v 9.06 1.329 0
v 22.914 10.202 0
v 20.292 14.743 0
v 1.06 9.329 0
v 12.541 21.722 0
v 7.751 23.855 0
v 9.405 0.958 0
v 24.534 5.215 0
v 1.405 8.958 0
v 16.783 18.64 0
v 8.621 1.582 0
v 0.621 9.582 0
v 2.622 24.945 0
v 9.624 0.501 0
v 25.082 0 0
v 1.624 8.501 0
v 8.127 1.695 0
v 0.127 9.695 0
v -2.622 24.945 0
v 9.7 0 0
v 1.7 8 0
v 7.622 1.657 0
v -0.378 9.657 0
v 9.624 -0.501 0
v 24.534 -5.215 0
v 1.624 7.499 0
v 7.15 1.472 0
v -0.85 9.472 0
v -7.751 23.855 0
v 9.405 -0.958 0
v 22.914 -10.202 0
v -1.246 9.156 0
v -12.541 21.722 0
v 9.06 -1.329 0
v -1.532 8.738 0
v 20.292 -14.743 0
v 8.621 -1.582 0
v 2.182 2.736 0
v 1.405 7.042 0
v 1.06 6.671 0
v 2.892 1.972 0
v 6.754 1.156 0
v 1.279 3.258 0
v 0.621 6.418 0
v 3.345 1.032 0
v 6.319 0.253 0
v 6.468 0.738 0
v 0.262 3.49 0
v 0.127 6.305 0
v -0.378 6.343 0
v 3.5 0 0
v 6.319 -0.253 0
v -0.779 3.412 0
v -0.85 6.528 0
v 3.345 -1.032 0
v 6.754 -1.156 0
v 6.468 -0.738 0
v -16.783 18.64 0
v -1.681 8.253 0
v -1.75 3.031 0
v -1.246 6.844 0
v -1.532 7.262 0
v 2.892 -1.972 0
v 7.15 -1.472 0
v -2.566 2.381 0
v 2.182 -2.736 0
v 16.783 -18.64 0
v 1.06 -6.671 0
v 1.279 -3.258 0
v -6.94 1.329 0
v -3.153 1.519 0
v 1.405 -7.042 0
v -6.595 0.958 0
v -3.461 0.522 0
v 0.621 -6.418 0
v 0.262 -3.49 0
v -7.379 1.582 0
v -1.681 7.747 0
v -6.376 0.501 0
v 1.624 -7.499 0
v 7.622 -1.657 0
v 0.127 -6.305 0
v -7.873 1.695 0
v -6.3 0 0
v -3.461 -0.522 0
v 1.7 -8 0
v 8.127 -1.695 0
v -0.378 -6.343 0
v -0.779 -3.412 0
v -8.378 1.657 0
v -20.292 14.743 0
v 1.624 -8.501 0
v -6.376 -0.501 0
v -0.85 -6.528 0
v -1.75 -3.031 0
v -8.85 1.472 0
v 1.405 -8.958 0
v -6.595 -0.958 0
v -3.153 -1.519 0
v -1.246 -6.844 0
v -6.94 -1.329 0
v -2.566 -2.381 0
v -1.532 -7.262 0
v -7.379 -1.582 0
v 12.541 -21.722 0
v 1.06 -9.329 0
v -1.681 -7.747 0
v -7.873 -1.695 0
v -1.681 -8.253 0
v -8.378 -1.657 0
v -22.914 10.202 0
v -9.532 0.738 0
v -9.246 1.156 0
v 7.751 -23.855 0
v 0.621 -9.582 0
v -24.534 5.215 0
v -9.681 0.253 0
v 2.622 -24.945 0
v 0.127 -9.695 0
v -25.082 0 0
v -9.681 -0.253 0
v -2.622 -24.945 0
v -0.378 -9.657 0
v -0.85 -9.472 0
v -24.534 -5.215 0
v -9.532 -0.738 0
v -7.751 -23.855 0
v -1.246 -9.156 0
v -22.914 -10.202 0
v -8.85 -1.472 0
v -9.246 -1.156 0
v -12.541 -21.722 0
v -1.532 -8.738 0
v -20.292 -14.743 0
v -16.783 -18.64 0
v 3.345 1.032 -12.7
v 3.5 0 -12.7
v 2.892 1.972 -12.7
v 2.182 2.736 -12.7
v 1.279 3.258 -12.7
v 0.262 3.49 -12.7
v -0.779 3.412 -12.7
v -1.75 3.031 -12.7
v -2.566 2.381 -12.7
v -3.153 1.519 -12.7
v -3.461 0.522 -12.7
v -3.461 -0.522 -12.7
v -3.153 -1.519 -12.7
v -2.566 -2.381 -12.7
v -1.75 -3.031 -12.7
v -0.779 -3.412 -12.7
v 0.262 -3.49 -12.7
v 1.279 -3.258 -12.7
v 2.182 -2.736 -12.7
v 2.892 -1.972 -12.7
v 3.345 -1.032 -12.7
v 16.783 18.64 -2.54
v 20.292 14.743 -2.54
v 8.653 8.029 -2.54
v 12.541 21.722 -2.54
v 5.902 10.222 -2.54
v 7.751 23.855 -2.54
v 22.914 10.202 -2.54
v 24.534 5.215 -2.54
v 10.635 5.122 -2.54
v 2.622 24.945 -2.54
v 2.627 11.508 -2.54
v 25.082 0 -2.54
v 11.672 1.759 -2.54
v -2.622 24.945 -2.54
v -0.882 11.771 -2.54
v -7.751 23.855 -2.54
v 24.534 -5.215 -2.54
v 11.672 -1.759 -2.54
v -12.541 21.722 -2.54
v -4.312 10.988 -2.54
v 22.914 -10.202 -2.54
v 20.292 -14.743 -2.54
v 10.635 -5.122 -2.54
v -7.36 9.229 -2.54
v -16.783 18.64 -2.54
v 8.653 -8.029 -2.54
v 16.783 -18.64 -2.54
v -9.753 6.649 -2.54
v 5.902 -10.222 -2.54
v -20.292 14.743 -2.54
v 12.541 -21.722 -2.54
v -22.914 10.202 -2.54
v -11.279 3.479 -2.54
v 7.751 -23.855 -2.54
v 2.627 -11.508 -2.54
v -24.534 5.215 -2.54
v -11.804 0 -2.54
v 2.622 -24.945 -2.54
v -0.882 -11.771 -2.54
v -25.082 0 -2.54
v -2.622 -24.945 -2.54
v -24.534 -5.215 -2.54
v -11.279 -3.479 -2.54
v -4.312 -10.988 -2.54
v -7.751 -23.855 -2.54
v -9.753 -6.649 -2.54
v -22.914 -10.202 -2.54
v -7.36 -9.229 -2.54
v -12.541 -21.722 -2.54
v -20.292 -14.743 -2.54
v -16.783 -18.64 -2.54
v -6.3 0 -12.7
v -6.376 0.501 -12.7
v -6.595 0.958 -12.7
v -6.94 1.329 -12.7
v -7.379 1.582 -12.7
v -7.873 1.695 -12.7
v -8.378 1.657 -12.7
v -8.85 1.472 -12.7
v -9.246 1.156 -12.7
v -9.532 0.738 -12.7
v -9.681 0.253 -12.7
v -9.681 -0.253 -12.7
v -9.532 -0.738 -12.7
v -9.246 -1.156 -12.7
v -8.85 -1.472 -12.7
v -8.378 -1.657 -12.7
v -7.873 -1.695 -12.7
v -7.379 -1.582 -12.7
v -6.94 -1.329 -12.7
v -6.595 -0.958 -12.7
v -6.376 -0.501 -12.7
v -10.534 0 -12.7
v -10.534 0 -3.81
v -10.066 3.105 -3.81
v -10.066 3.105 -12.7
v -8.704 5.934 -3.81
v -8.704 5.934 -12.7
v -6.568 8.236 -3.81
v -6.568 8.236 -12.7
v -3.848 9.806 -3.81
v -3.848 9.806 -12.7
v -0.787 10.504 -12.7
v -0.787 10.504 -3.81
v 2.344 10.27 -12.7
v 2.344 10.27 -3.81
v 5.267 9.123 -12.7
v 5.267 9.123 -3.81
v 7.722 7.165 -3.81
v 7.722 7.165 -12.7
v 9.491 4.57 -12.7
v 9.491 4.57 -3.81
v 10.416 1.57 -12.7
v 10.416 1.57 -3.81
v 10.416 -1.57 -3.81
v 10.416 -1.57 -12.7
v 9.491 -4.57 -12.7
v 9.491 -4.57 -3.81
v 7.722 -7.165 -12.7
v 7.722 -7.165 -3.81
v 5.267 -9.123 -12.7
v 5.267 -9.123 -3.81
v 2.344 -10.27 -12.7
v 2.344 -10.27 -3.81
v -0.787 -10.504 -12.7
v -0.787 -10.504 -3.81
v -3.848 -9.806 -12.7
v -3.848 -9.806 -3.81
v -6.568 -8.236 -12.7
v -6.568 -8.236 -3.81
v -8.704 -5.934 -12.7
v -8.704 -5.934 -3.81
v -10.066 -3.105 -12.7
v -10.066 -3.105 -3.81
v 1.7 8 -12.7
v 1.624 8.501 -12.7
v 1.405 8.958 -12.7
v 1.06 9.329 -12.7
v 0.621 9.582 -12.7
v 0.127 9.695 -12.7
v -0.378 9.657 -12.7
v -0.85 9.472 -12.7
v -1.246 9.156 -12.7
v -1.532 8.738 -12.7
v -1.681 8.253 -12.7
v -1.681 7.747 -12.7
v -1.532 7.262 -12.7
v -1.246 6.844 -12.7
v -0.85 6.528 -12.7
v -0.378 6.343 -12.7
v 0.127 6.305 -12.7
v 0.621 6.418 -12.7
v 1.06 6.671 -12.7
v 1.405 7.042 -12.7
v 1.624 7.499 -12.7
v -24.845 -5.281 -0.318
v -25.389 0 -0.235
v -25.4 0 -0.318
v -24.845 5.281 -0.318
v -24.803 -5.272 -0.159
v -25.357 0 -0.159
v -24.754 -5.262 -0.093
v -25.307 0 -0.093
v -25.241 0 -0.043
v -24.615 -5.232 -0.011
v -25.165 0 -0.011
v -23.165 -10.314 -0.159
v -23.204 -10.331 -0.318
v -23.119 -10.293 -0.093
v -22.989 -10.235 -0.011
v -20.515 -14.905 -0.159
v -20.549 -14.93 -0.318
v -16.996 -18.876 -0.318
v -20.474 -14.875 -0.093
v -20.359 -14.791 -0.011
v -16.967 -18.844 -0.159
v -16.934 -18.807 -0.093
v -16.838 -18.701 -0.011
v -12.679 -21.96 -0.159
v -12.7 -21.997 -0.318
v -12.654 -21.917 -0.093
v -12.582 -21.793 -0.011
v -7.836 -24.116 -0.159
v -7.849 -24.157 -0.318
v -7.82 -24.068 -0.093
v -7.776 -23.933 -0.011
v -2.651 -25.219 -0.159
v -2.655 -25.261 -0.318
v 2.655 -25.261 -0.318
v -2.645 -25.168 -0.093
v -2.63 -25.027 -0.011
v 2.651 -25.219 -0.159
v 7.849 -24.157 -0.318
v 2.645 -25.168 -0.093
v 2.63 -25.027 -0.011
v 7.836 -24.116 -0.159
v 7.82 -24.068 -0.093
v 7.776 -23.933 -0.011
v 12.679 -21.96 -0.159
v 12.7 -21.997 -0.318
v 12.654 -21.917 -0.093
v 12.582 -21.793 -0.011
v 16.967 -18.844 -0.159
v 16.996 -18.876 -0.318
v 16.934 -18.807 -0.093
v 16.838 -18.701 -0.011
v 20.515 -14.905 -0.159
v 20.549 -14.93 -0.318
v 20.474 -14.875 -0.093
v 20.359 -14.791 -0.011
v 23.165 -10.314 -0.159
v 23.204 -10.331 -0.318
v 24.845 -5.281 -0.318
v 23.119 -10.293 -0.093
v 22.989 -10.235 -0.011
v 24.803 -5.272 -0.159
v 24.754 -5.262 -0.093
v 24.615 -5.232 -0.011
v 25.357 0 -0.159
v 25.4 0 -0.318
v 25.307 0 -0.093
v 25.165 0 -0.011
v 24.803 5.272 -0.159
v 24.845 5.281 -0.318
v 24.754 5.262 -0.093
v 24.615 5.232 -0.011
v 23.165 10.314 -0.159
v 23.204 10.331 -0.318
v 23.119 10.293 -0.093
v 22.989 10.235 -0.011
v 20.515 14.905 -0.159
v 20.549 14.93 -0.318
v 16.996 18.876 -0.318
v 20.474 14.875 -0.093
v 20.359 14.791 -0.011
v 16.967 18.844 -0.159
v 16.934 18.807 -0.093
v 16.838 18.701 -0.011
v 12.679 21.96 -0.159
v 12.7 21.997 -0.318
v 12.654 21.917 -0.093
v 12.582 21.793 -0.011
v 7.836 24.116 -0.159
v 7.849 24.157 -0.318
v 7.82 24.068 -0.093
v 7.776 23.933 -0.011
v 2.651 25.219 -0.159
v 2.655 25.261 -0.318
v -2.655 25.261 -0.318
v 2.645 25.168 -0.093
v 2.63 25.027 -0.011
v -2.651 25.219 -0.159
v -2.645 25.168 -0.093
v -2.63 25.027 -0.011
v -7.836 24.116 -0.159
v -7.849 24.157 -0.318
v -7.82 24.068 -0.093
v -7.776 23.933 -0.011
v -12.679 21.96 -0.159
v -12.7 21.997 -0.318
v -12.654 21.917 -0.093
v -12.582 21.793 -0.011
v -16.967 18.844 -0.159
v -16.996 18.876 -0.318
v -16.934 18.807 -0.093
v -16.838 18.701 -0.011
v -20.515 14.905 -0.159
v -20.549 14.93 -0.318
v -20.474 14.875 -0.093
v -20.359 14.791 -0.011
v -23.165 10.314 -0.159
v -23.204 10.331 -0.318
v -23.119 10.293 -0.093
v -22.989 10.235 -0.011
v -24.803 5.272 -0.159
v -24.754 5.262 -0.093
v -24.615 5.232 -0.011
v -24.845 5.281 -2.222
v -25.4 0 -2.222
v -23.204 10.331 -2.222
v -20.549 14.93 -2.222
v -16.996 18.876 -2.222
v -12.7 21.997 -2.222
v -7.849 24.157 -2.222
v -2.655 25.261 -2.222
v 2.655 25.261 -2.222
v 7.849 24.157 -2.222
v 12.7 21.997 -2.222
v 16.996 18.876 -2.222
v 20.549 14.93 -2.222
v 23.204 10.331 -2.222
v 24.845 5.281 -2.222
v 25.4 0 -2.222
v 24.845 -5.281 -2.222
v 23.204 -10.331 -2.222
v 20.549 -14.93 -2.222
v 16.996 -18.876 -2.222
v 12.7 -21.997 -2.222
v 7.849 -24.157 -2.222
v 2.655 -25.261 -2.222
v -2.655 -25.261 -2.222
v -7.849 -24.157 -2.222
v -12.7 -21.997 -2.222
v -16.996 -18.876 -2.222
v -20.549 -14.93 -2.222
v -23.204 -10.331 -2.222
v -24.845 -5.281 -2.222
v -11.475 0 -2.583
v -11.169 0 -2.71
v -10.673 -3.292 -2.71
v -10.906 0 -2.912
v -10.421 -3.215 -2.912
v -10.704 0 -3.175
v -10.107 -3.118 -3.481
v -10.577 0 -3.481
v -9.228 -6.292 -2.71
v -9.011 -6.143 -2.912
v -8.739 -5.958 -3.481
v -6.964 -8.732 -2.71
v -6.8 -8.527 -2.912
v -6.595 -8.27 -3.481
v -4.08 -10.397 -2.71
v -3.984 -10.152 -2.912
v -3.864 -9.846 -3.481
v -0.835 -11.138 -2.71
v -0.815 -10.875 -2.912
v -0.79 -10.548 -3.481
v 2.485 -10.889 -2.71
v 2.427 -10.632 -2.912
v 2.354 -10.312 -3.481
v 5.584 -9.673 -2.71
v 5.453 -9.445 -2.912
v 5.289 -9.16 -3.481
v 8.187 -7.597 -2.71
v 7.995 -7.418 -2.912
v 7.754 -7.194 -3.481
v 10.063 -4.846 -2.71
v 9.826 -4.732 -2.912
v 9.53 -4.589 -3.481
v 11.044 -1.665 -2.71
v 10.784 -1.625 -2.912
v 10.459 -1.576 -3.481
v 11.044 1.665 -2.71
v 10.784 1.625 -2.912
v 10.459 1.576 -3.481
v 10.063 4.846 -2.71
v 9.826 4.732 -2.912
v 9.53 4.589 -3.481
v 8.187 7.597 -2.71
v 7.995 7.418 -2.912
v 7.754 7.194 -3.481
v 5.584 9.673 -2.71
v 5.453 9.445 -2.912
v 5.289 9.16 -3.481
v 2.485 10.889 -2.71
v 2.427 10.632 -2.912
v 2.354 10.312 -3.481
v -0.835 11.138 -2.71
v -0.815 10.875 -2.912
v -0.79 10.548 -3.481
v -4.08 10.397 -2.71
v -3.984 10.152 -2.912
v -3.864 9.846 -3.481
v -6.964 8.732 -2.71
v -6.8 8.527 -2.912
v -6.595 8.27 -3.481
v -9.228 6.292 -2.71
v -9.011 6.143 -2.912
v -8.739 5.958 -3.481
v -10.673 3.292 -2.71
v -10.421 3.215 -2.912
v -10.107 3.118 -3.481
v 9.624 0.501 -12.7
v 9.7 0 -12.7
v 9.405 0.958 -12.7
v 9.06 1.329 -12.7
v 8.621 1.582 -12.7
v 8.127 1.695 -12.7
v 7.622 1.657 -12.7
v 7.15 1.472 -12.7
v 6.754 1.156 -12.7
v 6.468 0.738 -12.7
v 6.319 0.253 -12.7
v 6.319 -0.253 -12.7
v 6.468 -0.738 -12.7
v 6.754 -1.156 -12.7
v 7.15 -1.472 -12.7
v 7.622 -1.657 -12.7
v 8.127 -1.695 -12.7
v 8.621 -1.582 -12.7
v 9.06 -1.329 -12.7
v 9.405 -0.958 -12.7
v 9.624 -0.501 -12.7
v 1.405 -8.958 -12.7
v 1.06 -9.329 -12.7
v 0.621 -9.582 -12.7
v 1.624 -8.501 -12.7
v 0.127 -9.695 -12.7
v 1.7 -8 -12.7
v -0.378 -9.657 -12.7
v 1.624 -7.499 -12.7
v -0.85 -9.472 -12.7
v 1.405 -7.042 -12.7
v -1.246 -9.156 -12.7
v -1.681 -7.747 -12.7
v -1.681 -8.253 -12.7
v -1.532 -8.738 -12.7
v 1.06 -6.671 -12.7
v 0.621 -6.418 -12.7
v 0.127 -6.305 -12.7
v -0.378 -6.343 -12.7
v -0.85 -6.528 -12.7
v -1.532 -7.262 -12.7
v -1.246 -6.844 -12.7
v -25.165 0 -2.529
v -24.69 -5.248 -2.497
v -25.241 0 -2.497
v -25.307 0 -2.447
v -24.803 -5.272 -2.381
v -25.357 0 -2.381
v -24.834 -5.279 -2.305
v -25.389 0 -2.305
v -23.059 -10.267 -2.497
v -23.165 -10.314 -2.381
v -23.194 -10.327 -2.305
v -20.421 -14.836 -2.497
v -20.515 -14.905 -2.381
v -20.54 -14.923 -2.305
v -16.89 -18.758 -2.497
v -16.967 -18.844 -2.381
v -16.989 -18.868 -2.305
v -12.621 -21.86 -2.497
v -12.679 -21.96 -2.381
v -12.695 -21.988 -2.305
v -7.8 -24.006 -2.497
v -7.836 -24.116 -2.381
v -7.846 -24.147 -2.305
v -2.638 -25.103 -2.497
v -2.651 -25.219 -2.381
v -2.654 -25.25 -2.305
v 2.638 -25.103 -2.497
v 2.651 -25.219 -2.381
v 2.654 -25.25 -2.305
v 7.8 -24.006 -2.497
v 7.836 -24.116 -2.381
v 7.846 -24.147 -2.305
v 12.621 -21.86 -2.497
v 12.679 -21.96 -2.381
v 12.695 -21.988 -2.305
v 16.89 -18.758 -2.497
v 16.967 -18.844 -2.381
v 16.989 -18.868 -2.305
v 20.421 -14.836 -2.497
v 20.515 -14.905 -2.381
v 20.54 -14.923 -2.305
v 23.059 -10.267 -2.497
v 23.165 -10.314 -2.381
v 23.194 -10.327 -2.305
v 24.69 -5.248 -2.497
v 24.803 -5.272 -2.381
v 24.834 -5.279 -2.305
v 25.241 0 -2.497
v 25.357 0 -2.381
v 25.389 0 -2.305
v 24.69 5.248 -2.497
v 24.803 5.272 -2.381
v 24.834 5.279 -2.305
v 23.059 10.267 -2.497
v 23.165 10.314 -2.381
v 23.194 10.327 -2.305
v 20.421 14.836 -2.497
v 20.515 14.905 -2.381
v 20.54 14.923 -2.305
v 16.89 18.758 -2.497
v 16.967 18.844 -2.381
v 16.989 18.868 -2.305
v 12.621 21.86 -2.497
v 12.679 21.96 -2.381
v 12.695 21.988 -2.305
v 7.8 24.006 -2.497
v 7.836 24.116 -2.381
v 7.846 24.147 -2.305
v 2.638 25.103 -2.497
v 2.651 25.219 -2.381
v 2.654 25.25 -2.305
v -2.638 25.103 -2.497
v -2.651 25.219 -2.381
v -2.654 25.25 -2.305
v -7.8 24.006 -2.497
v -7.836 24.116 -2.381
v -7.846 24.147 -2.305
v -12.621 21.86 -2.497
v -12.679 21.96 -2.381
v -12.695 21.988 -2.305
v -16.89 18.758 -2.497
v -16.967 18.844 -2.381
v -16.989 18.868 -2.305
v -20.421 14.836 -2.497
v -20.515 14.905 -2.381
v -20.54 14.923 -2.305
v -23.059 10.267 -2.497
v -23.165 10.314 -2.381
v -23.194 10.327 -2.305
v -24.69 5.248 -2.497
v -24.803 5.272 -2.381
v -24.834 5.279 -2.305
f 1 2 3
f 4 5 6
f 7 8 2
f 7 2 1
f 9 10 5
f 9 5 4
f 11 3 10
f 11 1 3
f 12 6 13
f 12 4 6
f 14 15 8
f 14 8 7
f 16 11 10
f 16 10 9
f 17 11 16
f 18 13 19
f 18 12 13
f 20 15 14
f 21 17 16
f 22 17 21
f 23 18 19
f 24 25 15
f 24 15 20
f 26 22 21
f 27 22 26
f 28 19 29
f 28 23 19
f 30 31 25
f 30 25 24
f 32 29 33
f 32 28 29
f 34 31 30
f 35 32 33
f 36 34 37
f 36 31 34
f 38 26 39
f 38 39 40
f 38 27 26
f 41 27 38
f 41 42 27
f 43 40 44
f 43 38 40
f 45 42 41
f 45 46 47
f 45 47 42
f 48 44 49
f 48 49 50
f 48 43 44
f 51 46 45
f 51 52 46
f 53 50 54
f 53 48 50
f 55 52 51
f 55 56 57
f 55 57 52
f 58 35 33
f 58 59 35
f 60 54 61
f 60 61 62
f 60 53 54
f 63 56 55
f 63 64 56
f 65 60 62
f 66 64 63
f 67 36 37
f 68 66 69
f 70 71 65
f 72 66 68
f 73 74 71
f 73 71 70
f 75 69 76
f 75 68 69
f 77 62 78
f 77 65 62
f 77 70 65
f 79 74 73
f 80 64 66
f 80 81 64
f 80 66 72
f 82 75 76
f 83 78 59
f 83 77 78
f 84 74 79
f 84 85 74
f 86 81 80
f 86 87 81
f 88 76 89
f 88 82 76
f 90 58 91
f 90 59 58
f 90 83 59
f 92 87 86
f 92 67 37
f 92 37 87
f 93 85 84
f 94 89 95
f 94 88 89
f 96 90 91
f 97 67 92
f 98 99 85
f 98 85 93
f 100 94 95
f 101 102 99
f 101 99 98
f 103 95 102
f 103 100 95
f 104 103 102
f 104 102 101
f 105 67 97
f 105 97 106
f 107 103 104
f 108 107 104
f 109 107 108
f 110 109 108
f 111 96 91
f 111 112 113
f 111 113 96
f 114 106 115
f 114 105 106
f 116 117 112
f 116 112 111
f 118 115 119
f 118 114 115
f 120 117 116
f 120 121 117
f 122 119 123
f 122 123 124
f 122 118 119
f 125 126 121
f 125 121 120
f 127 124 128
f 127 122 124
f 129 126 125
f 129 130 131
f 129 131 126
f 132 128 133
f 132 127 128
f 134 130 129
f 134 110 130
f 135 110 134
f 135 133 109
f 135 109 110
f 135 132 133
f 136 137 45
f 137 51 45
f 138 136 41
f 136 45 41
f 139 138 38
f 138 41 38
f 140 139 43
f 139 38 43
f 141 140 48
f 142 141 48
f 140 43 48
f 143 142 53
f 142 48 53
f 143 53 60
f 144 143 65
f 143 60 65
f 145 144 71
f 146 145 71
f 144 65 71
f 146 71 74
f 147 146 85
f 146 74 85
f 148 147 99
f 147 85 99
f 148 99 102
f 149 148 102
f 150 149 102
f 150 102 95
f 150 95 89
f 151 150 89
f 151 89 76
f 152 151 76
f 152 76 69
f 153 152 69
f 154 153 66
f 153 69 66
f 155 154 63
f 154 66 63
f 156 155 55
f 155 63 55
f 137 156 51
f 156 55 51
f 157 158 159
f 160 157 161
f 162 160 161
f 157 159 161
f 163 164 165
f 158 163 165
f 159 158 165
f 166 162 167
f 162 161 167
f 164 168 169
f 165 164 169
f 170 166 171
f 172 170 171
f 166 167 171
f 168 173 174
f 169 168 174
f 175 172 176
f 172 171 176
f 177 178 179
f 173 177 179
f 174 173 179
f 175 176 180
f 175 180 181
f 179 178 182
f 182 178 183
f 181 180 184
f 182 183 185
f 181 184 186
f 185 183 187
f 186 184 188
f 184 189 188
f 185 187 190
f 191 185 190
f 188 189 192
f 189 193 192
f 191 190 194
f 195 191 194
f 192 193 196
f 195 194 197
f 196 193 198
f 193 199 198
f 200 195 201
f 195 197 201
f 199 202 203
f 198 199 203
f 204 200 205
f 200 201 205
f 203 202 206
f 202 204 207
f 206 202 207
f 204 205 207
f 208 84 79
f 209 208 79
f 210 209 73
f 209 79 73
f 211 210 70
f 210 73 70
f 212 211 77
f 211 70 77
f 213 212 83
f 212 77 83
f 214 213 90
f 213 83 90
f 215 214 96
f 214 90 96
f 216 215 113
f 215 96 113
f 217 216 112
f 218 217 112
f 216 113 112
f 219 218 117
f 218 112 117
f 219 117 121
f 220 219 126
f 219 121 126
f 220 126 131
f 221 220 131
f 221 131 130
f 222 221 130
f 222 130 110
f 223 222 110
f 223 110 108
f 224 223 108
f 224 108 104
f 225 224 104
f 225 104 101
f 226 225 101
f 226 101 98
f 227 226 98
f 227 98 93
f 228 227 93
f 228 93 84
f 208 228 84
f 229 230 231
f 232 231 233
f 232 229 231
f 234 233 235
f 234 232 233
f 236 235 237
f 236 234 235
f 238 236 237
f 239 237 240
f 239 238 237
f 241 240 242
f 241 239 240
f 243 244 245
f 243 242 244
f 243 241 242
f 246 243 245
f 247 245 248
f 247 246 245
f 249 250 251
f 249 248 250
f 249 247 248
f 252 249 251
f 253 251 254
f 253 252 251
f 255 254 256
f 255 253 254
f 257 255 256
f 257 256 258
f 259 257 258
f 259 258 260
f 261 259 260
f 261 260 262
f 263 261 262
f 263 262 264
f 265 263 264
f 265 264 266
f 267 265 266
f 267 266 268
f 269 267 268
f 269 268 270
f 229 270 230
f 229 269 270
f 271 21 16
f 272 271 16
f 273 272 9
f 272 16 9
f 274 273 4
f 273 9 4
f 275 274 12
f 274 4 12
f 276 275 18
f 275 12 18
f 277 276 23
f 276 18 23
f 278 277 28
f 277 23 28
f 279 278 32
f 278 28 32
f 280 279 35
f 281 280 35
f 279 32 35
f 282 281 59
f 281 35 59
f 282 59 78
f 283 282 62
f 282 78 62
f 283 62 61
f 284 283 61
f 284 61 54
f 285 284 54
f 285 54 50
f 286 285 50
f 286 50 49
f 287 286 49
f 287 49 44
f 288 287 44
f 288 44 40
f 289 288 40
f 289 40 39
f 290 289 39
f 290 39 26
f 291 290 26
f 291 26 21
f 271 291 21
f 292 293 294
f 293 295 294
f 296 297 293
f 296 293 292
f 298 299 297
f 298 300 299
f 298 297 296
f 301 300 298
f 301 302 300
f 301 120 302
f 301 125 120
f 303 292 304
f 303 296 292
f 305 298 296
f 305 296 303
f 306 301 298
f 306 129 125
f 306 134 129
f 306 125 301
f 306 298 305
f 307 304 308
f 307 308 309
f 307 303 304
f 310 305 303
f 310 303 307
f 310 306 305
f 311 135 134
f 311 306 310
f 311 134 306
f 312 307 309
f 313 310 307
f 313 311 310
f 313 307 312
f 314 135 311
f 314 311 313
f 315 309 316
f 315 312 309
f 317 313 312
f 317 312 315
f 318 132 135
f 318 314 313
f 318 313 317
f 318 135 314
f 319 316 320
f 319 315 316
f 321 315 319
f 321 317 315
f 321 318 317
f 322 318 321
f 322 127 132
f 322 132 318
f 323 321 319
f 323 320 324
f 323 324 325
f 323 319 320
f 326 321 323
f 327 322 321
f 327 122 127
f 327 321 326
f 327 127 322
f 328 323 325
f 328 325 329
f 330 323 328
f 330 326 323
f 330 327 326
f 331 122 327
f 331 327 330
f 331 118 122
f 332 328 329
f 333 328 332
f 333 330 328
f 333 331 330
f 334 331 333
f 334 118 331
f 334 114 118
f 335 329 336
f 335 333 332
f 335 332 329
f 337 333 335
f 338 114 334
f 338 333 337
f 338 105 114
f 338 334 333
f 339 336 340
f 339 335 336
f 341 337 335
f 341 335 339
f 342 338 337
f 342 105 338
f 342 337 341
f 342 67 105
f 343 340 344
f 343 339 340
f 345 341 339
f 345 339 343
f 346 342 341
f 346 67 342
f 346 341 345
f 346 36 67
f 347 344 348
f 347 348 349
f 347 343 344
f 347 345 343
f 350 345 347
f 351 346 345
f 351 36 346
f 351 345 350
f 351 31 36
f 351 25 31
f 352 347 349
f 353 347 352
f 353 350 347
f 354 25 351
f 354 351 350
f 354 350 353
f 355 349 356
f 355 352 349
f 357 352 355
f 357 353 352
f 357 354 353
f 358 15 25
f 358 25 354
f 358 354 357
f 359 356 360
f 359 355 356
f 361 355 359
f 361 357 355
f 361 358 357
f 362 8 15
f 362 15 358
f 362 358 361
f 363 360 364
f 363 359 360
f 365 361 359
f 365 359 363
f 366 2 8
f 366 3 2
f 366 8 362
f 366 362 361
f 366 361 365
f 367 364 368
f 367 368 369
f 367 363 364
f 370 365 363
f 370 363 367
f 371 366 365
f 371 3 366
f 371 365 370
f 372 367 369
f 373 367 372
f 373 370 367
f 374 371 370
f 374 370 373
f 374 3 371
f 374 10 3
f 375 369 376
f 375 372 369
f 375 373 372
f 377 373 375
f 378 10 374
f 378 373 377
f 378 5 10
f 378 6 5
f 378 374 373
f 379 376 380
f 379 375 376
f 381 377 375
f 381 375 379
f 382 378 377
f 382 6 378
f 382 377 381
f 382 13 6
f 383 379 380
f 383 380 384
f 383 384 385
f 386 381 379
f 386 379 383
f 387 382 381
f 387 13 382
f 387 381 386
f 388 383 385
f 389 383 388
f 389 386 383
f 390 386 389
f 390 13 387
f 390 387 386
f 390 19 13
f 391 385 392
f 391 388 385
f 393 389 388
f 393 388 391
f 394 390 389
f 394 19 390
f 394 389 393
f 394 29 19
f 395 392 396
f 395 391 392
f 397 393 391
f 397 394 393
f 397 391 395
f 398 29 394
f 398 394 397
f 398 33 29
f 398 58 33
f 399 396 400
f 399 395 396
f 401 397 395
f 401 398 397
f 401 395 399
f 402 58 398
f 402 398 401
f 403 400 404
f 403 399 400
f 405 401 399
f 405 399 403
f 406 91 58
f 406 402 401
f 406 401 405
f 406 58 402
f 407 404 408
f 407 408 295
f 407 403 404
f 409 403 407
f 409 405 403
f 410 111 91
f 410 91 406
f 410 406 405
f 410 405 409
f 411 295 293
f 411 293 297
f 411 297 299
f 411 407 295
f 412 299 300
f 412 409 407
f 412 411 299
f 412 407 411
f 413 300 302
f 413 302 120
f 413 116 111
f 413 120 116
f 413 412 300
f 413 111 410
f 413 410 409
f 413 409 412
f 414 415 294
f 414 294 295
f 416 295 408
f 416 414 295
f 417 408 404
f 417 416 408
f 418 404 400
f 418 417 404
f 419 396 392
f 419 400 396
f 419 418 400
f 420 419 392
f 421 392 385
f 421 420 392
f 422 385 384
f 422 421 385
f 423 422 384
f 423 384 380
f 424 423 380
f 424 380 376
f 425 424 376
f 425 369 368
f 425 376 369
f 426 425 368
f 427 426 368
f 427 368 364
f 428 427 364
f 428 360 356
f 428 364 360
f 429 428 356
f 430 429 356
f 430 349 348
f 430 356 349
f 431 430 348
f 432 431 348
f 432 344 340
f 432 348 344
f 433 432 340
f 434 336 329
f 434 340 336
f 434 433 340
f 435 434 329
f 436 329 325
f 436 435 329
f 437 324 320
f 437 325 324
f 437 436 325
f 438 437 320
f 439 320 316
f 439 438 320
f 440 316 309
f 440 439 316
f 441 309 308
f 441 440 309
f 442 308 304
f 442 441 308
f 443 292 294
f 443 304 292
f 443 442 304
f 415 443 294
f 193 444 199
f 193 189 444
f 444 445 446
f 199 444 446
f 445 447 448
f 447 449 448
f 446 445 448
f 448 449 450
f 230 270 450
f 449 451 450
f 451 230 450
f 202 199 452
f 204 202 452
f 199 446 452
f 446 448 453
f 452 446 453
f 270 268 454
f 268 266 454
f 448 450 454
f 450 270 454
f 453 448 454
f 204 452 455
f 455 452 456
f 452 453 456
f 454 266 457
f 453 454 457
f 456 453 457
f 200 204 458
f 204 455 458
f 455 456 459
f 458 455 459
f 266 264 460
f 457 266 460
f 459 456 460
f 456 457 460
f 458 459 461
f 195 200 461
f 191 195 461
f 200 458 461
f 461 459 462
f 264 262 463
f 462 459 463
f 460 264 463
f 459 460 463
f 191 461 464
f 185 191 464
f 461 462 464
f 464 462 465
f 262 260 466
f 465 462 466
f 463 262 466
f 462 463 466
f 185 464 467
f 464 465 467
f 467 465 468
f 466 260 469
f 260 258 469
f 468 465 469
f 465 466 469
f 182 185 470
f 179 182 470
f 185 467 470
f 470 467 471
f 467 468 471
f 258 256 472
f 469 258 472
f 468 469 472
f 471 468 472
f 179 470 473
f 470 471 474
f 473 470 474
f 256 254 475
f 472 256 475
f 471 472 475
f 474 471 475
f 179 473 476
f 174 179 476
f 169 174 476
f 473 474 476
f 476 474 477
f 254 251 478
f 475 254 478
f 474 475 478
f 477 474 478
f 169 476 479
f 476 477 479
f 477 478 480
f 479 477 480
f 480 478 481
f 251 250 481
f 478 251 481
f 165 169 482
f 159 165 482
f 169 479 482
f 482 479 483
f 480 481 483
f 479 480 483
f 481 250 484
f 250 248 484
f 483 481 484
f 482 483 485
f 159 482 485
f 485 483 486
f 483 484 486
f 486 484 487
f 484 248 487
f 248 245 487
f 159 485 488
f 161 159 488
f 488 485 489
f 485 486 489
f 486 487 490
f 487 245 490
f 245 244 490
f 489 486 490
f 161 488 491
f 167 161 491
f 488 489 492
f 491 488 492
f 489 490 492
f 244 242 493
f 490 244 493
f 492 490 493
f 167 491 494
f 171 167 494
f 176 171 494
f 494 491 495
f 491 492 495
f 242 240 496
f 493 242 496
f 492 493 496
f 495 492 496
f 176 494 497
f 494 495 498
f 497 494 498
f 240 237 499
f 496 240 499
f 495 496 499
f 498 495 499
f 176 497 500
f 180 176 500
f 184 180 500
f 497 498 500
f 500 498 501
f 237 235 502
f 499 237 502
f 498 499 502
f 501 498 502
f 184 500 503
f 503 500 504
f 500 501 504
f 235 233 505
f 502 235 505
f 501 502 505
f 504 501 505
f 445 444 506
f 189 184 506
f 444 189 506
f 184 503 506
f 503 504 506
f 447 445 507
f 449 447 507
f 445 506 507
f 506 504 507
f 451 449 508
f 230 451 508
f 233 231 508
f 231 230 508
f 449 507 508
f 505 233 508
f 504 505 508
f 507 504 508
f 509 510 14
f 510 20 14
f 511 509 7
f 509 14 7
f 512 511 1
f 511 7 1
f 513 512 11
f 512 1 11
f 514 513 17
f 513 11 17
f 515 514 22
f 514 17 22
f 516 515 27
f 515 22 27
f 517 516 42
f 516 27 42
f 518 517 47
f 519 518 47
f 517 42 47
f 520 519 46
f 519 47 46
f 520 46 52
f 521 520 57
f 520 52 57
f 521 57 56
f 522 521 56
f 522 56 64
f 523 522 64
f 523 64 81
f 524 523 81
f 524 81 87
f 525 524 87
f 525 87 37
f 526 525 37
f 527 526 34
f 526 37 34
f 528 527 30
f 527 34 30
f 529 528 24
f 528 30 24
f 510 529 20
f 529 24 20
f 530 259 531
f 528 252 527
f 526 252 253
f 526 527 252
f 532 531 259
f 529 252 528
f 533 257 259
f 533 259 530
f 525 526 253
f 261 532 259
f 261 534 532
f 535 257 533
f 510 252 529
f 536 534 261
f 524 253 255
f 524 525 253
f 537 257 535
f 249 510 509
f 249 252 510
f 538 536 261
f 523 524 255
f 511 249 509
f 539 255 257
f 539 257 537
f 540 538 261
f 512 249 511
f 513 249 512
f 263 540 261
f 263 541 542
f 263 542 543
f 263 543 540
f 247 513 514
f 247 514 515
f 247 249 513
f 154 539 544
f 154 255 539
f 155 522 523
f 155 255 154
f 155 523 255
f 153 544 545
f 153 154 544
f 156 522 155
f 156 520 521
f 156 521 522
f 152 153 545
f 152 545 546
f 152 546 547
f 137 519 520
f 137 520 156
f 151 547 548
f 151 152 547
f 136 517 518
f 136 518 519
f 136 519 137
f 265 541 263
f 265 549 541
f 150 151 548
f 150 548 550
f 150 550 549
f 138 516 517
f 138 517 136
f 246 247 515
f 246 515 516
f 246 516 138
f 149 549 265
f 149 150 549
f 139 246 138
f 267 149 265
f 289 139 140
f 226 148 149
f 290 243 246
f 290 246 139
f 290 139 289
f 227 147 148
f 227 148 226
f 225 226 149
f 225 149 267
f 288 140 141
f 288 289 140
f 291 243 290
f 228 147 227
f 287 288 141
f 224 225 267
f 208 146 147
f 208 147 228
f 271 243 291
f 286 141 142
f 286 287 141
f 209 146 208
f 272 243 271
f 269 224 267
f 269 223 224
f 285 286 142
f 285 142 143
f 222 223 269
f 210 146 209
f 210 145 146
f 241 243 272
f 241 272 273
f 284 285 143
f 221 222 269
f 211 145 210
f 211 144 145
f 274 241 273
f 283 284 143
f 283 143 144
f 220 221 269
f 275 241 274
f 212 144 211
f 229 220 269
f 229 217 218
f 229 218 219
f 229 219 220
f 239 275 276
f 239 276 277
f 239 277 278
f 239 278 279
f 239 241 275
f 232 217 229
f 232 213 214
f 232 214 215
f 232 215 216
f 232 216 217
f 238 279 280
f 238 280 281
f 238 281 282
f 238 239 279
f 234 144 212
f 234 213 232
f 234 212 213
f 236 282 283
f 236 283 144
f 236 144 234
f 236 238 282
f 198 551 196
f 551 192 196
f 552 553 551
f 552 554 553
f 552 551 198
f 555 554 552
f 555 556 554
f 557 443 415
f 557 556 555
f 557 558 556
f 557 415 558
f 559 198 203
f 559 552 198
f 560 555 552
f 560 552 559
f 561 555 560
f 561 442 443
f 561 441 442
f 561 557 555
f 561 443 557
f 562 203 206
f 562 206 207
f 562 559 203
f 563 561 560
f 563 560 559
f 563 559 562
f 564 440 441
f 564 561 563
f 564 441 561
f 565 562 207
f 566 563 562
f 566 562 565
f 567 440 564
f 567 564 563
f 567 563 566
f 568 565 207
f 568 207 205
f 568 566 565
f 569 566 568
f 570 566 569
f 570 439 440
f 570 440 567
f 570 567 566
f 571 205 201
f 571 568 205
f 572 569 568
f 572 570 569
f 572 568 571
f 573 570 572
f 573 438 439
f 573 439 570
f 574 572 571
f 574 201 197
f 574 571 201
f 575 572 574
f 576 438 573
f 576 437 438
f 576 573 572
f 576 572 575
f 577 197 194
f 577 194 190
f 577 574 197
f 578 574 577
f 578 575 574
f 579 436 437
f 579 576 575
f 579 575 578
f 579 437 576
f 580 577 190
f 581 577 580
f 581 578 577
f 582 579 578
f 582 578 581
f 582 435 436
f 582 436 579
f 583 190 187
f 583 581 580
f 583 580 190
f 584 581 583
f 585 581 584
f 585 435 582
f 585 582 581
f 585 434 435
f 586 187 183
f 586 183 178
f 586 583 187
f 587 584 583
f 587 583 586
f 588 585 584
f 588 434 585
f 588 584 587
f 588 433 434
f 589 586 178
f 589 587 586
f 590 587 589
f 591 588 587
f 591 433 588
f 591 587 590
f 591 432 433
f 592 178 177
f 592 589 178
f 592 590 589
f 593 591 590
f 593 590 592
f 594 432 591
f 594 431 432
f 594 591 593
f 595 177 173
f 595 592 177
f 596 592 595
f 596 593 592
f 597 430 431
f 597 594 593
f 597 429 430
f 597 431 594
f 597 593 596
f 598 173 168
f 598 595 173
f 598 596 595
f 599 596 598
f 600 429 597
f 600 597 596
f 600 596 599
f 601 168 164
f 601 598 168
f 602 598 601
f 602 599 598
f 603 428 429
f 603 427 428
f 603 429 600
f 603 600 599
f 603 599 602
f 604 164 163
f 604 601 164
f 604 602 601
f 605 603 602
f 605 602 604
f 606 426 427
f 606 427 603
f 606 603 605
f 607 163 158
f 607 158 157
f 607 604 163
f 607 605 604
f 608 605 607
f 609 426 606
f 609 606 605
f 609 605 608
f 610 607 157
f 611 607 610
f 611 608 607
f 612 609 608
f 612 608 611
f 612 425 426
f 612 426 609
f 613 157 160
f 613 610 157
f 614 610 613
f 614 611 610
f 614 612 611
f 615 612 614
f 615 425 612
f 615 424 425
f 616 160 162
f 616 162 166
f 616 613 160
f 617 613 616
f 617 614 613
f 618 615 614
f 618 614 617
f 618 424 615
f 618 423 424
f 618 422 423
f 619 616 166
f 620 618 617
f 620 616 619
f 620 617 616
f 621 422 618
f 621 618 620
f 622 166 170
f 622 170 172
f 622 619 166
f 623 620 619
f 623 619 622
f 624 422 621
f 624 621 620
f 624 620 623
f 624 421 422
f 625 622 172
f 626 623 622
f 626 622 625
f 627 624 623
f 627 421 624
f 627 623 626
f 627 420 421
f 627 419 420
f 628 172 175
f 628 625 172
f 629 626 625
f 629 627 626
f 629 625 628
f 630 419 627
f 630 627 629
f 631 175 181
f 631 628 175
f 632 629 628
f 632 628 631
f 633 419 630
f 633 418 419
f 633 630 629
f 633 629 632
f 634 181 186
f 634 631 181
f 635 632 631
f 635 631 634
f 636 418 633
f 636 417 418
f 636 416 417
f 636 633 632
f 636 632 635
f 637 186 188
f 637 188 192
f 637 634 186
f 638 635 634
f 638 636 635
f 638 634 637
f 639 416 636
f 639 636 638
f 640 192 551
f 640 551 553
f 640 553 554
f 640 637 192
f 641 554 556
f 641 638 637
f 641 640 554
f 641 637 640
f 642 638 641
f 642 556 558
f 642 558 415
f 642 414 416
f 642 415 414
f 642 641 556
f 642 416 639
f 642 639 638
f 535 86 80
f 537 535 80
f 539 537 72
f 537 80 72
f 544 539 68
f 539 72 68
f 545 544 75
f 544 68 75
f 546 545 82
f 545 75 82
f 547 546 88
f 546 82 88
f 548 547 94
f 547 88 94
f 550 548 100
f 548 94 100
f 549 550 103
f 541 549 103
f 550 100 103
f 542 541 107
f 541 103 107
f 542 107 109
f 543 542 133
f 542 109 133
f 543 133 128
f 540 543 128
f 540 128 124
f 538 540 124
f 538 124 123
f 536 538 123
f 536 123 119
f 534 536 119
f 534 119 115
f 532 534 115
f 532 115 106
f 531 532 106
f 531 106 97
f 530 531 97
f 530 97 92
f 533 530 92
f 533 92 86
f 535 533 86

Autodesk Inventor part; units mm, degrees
ref_plane "YZ Plane" through (0, 0, 0) normal (1, 0, 0) x (0, 1, 0)
ref_plane "XZ Plane" through (0, 0, 0) normal (0, 1, 0) x (-1, 0, 0)
ref_plane "XY Plane" through (0, 0, 0) normal (0, 0, 1) x (1, 0, 0)
sketch "Sketch1" plane through (0, 0, 0) normal (0, 1, 0) x (-1, 0, 0)
  line L0 (0, 0) -> (25.0825, 0)
  line L1 (25.0825, -25.4) -> (0, -25.4)
  line L2 (0, -25.4) -> (0, 0)
  line L3 (25.0825, -2.54) -> (11.8039, -2.54)
  line L4 (25.0825, -22.86) -> (11.8039, -22.86)
  line L5 (10.5339, -3.81) -> (10.5339, -21.59)
  line L6 (25.4, -0.3175) -> (25.4, -2.2225)
  line L7 (25.4, -23.1775) -> (25.4, -25.0825)
  arc A0 (25.4, -0.3175) -> (25.0825, 0) centre (25.0825, -0.3175) ccw
  arc A1 (25.0825, -2.54) -> (25.4, -2.2225) centre (25.0825, -2.2225) ccw
  arc A2 (25.4, -23.1775) -> (25.0825, -22.86) centre (25.0825, -23.1775) ccw
  arc A3 (25.0825, -25.4) -> (25.4, -25.0825) centre (25.0825, -25.0825) ccw
  arc A4 (11.8039, -2.54) -> (10.5339, -3.81) centre (11.8039, -3.81) ccw
  arc A5 (10.5339, -21.59) -> (11.8039, -22.86) centre (11.8039, -21.59) ccw
  point P0 (25.4, -25.4)
  point P1 (25.4, 0)
  dimension "d0" = 25.4
  dimension "d2" = 2.54
  dimension "d3" = 2.54
  dimension "d4" = 0.3175
  dimension "d5" = 1.27
  dimension "d7" = 25.4
revolve "Revolution1" add sketch "Sketch1" angle 360 about axis through (0, 0, -25.4) along (0, 0, 1)
sketch "Sketch2" plane through (0, 0, 0) normal (0, 0, 1) x (1, 0, 0)
  circle A0 centre (0, 0) radius 3.5
  circle A1 centre (0, 8) radius 1.7
  circle A2 centre (0, 0) radius 8
  circle A3 centre (-8, 0) radius 1.7
  circle A4 centre (0, -8) radius 1.7
  circle A5 centre (8, 0) radius 1.7
  dimension "d10" = 16
  dimension "d8" = 7
  dimension "d9" = 3.4
  dimension "d13" = 360
extrude "Extrusion1" cut sketch "Sketch2" against normal through all contours A0 | A1 A2 | A2 A1 | A3 A2 | A2 A3 | A5 A2 | A2 A5 | A4 A2 | A2 A4
ref_plane "Work Plane1" through (0, 0, -12.7) normal (0, 0, -1) x (-1, 0, 0)
sketch "Sketch3" plane through (0, 0, -25.4) normal (0, 0, -1) x (-1, 0, 0)
  circle A0 centre (0, 0) radius 25.4 projected
  point P0 (0, 0)
extrude "Extrusion2" cut sketch "Sketch3" against normal blind 12.7
properties part number "Pulley"
